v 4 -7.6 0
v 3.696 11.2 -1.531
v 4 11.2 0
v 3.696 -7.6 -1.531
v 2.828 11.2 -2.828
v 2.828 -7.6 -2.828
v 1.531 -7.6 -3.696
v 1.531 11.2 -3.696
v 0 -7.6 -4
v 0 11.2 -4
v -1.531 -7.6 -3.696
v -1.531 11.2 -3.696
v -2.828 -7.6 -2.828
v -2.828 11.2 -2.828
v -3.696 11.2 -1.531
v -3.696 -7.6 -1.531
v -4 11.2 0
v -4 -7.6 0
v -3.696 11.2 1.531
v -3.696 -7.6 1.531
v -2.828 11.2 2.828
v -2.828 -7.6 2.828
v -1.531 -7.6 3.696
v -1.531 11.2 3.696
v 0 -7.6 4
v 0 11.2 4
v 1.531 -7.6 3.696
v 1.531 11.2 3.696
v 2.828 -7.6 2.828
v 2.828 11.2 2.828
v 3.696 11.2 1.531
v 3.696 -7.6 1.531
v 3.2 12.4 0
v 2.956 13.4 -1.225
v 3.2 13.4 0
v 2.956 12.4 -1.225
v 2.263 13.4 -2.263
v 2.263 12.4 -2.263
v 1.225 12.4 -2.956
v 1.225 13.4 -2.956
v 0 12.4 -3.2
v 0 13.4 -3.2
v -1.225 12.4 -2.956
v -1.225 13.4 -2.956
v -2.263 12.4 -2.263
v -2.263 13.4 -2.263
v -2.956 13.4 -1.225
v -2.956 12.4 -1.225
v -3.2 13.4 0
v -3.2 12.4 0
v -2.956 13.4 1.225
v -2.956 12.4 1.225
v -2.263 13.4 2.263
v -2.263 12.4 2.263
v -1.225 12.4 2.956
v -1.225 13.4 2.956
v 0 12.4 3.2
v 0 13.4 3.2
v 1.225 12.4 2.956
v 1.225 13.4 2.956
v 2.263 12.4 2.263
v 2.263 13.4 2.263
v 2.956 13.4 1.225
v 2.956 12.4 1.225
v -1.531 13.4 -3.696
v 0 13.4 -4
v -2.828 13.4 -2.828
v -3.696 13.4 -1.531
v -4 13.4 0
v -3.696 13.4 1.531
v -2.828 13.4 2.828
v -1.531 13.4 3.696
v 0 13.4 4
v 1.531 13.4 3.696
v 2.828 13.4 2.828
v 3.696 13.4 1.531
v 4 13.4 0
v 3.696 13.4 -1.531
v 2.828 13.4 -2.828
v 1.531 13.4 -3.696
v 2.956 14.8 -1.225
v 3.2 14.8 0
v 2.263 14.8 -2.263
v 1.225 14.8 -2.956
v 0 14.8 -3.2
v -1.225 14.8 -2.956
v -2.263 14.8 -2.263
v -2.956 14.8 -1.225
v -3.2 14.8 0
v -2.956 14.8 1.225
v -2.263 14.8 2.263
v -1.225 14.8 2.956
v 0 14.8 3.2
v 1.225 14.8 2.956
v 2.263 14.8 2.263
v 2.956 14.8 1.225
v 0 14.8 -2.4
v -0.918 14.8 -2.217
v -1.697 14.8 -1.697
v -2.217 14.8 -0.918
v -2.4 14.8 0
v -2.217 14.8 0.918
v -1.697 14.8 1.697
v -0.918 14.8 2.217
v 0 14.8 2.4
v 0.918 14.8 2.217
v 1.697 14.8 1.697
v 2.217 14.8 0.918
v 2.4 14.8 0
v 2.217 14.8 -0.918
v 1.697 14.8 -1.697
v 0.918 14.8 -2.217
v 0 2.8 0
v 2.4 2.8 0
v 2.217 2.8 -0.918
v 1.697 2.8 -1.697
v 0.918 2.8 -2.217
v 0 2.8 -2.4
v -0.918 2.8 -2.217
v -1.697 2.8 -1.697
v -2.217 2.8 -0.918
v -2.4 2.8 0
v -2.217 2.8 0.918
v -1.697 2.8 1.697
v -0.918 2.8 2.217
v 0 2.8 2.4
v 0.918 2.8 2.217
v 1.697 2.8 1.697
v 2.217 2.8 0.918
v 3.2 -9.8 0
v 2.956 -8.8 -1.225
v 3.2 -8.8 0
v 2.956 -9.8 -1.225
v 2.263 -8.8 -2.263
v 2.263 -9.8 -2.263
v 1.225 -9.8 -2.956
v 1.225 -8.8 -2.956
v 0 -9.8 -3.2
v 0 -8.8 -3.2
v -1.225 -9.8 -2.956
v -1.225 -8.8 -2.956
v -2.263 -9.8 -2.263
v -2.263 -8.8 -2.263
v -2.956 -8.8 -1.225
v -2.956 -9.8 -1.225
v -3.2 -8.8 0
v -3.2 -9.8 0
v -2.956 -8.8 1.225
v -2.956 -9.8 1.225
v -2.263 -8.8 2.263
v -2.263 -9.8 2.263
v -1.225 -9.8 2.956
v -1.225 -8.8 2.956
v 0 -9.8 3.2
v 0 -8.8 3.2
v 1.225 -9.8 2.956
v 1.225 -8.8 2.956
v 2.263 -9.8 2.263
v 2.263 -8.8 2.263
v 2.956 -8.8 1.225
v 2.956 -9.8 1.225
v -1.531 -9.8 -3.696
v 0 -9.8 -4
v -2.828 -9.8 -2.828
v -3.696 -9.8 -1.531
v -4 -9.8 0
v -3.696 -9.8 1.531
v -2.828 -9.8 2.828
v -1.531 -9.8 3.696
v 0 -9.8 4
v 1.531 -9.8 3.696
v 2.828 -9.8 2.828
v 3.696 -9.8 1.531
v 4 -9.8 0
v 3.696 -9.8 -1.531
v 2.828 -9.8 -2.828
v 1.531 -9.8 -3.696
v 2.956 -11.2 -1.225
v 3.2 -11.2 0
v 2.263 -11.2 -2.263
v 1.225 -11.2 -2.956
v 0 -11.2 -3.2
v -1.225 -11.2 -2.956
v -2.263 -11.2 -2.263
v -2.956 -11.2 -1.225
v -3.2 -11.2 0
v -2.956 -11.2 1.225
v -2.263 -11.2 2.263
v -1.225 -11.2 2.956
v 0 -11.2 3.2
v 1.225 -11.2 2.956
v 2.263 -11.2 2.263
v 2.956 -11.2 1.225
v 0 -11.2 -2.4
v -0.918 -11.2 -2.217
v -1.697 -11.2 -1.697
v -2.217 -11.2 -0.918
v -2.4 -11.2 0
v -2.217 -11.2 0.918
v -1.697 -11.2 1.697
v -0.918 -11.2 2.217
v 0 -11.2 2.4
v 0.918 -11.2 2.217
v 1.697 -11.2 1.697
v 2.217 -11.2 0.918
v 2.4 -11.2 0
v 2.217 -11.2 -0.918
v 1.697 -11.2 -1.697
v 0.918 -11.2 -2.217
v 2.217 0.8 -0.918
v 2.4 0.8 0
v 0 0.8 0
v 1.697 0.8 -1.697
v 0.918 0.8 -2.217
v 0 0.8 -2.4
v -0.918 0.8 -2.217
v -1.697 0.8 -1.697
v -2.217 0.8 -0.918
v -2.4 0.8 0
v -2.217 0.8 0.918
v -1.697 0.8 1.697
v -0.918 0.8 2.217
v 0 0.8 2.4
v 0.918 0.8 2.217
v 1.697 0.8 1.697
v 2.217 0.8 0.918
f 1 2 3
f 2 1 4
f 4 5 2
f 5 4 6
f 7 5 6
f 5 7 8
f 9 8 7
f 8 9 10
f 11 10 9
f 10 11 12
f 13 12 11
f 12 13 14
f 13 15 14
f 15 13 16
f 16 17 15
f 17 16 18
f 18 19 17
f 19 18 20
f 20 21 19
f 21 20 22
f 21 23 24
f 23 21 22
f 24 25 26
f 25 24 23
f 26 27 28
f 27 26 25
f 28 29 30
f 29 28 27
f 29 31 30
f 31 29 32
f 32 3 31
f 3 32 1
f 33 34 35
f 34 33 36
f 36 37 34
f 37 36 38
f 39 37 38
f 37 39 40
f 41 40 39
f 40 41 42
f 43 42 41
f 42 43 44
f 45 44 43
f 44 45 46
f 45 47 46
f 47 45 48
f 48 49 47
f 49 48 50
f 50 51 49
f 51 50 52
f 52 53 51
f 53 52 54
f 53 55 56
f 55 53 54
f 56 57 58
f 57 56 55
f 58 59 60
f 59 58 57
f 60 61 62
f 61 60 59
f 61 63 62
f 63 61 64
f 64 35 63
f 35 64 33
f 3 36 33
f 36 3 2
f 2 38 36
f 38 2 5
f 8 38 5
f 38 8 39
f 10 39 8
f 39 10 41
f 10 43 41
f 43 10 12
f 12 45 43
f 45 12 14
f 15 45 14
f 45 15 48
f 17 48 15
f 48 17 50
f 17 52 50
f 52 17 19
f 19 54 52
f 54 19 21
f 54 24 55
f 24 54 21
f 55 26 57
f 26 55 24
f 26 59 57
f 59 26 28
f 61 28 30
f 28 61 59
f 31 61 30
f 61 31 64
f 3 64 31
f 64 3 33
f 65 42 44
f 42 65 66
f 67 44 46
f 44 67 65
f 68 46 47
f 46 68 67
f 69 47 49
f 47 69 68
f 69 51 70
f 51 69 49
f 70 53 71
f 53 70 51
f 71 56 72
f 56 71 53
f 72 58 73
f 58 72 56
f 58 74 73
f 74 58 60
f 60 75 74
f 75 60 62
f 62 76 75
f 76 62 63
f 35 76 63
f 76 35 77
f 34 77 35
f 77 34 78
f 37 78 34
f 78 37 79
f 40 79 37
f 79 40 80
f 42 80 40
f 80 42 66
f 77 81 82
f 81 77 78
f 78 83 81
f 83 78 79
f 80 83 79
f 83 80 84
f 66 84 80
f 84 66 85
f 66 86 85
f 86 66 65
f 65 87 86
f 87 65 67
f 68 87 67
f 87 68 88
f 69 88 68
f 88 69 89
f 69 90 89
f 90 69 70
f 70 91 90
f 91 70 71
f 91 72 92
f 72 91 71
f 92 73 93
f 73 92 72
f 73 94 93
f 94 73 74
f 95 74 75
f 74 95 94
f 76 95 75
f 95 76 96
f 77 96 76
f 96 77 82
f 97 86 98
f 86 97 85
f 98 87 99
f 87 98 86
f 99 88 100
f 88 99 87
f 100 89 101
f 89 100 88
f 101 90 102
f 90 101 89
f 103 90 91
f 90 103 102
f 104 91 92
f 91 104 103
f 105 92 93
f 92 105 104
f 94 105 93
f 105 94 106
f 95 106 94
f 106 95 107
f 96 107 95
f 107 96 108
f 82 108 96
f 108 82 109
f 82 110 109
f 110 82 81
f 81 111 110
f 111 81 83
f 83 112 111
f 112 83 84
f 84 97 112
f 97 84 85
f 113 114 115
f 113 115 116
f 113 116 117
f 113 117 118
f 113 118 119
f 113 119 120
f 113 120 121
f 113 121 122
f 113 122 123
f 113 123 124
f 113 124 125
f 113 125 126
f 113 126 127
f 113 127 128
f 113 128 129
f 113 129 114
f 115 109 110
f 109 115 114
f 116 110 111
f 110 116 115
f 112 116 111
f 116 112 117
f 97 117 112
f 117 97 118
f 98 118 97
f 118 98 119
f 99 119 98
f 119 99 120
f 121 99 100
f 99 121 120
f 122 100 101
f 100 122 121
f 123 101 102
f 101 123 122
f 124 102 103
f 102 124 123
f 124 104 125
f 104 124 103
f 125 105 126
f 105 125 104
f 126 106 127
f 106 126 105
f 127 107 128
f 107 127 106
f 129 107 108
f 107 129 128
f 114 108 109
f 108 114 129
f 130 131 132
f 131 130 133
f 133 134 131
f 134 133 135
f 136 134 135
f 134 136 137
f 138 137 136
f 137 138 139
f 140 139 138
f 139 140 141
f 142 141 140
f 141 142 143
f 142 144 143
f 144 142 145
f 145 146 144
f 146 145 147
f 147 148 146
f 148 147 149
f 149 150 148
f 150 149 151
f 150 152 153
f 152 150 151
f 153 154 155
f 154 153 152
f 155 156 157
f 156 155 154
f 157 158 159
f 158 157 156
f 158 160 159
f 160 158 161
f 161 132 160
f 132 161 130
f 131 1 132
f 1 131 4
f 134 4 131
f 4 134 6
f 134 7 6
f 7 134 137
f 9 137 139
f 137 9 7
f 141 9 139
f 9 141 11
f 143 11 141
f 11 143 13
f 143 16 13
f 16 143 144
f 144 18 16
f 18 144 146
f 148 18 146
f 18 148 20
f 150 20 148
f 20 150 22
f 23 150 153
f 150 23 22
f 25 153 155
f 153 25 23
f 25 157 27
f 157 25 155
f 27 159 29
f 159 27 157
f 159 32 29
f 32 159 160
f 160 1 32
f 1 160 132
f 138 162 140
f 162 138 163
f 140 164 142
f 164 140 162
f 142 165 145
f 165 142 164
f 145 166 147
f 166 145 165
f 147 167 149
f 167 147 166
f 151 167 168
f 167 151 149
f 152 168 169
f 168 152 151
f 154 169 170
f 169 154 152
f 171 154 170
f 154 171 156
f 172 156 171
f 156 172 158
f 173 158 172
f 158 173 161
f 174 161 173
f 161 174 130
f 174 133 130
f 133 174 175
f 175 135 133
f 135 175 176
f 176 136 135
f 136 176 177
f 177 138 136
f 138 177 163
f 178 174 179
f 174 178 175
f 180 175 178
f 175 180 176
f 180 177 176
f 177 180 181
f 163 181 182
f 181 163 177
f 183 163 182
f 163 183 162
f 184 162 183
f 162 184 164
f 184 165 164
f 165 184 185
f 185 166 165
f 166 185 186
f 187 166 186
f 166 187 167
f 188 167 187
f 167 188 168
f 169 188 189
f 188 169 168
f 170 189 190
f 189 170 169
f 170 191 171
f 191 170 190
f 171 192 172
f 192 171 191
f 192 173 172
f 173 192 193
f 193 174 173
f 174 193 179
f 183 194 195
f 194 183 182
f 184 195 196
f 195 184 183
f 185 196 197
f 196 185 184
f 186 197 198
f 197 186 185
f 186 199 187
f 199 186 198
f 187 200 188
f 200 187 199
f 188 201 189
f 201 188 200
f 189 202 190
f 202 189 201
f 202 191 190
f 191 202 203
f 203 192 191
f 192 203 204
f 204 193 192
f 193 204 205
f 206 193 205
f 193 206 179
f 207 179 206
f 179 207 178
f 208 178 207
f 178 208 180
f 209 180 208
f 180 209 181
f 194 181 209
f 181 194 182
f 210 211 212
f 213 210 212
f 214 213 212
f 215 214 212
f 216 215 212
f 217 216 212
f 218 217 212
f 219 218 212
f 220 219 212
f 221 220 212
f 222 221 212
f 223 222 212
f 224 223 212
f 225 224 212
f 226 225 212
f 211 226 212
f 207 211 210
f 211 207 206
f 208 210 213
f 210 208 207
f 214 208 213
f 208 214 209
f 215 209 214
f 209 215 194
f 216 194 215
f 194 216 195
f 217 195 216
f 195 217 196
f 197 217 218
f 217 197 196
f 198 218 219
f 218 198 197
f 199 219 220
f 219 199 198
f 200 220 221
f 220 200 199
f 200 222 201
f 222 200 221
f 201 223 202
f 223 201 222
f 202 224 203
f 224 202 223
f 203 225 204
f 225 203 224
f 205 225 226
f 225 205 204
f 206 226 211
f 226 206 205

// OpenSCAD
// file: ../p/4-4disc.scad
use <../lib.scad>
function ldraw_lib__4_4disc() = [
// 0 Disc 1.0
// 0 Name: 4-4disc.dat
// 0 Author: James Jessiman
// 0 !LDRAW_ORG Primitive UPDATE 2002-02
// 0 !LICENSE Licensed under CC BY 4.0 : see CAreadme.txt
// 
// 0 BFC CERTIFY CCW
  [0,"BFC","CERTIFY"],
  [0,"BFC","CCW"],
// 
// 0 !HISTORY 1998-12-15 [PTadmin] Official Update 1998-10
// 0 !HISTORY 2002-03-23 [sbliss] Added BFC statement
// 0 !HISTORY 2002-04-25 [PTadmin] Official Update 2002-02
// 0 !HISTORY 2007-06-24 [PTadmin] Header formatted for Contributor Agreement
// 0 !HISTORY 2008-07-01 [PTadmin] Official Update 2008-01
// 
// 
// 3 16 0 0 0 1 0 0 0.9239 0 0.3827
  [3,16,0,0,0,1,0,0,0.9239,0,0.3827],
// 3 16 0 0 0 0.9239 0 0.3827 0.7071 0 0.7071
  [3,16,0,0,0,0.9239,0,0.3827,0.7071,0,0.7071],
// 3 16 0 0 0 0.7071 0 0.7071 0.3827 0 0.9239
  [3,16,0,0,0,0.7071,0,0.7071,0.3827,0,0.9239],
// 3 16 0 0 0 0.3827 0 0.9239 0 0 1
  [3,16,0,0,0,0.3827,0,0.9239,0,0,1],
// 3 16 0 0 0 0 0 1 -0.3827 0 0.9239
  [3,16,0,0,0,0,0,1,-0.3827,0,0.9239],
// 3 16 0 0 0 -0.3827 0 0.9239 -0.7071 0 0.7071
  [3,16,0,0,0,-0.3827,0,0.9239,-0.7071,0,0.7071],
// 3 16 0 0 0 -0.7071 0 0.7071 -0.9239 0 0.3827
  [3,16,0,0,0,-0.7071,0,0.7071,-0.9239,0,0.3827],
// 3 16 0 0 0 -0.9239 0 0.3827 -1 0 -0
  [3,16,0,0,0,-0.9239,0,0.3827,-1,0,-0],
// 3 16 0 0 0 -1 0 -0 -0.9239 0 -0.3827
  [3,16,0,0,0,-1,0,-0,-0.9239,0,-0.3827],
// 3 16 0 0 0 -0.9239 0 -0.3827 -0.7071 0 -0.7071
  [3,16,0,0,0,-0.9239,0,-0.3827,-0.7071,0,-0.7071],
// 3 16 0 0 0 -0.7071 0 -0.7071 -0.3827 0 -0.9239
  [3,16,0,0,0,-0.7071,0,-0.7071,-0.3827,0,-0.9239],
// 3 16 0 0 0 -0.3827 0 -0.9239 0 0 -1
  [3,16,0,0,0,-0.3827,0,-0.9239,0,0,-1],
// 3 16 0 0 0 0 0 -1 0.3827 0 -0.9239
  [3,16,0,0,0,0,0,-1,0.3827,0,-0.9239],
// 3 16 0 0 0 0.3827 0 -0.9239 0.7071 0 -0.7071
  [3,16,0,0,0,0.3827,0,-0.9239,0.7071,0,-0.7071],
// 3 16 0 0 0 0.7071 0 -0.7071 0.9239 0 -0.3827
  [3,16,0,0,0,0.7071,0,-0.7071,0.9239,0,-0.3827],
// 3 16 0 0 0 0.9239 0 -0.3827 1 0 0
  [3,16,0,0,0,0.9239,0,-0.3827,1,0,0],
// 0
];
module ldraw_lib__4_4disc(step=0, col=false, unit=2/5, alt=false, line=0.2, solid=!$preview)
    makepoly(ldraw_lib__4_4disc(), step=step, col=col, unit=unit, alt=alt, line=line, solid=solid);
ldraw_lib__4_4disc(line=0.2);
// file: ../p/4-4cyli.scad
use <../lib.scad>
function ldraw_lib__4_4cyli() = [
// 0 Cylinder 1.0
// 0 Name: 4-4cyli.dat
// 0 Author: James Jessiman
// 0 !LDRAW_ORG Primitive UPDATE 2005-01
// 0 !LICENSE Licensed under CC BY 4.0 : see CAreadme.txt
// 
// 0 BFC CERTIFY CCW
  [0,"BFC","CERTIFY"],
  [0,"BFC","CCW"],
// 
// 0 !HISTORY 1998-12-15 [PTadmin] Official Update 1998-10
// 0 !HISTORY 2002-03-23 [sbliss] Added BFC statement; merged headers from files in distributions LDraw 0.27 and Complete.
// 0 !HISTORY 2002-04-25 [PTadmin] Official Update 2002-02
// 0 !HISTORY 2004-12-14 [guyvivan] BFC CCW
// 0 !HISTORY 2005-12-28 [PTadmin] Official Update 2005-01
// 0 !HISTORY 2007-06-24 [PTadmin] Header formatted for Contributor Agreement
// 0 !HISTORY 2008-07-01 [PTadmin] Official Update 2008-01
// 
// 
// 4 16 1 1 0 0.9239 1 0.3827 0.9239 0 0.3827 1 0 0
  [4,16,1,1,0,0.9239,1,0.3827,0.9239,0,0.3827,1,0,0],
// 5 24 1 0 0 1 1 0 0.9239 0 0.3827 0.9239 0 -0.3827
  [5,24,1,0,0,1,1,0,0.9239,0,0.3827,0.9239,0,-0.3827],
// 4 16 0.9239 1 0.3827 0.7071 1 0.7071 0.7071 0 0.7071 0.9239 0 0.3827
  [4,16,0.9239,1,0.3827,0.7071,1,0.7071,0.7071,0,0.7071,0.9239,0,0.3827],
// 5 24 0.9239 0 0.3827 0.9239 1 0.3827 0.7071 0 0.7071 1 0 0
  [5,24,0.9239,0,0.3827,0.9239,1,0.3827,0.7071,0,0.7071,1,0,0],
// 4 16 0.7071 1 0.7071 0.3827 1 0.9239 0.3827 0 0.9239 0.7071 0 0.7071
  [4,16,0.7071,1,0.7071,0.3827,1,0.9239,0.3827,0,0.9239,0.7071,0,0.7071],
// 5 24 0.7071 0 0.7071 0.7071 1 0.7071 0.3827 0 0.9239 0.9239 0 0.3827
  [5,24,0.7071,0,0.7071,0.7071,1,0.7071,0.3827,0,0.9239,0.9239,0,0.3827],
// 4 16 0.3827 1 0.9239 0 1 1 0 0 1 0.3827 0 0.9239
  [4,16,0.3827,1,0.9239,0,1,1,0,0,1,0.3827,0,0.9239],
// 5 24 0.3827 0 0.9239 0.3827 1 0.9239 0 0 1 0.7071 0 0.7071
  [5,24,0.3827,0,0.9239,0.3827,1,0.9239,0,0,1,0.7071,0,0.7071],
// 4 16 0 1 1 -0.3827 1 0.9239 -0.3827 0 0.9239 0 0 1
  [4,16,0,1,1,-0.3827,1,0.9239,-0.3827,0,0.9239,0,0,1],
// 5 24 0 0 1 0 1 1 -0.3827 0 0.9239 0.3827 0 0.9239
  [5,24,0,0,1,0,1,1,-0.3827,0,0.9239,0.3827,0,0.9239],
// 4 16 -0.3827 1 0.9239 -0.7071 1 0.7071 -0.7071 0 0.7071 -0.3827 0 0.9239
  [4,16,-0.3827,1,0.9239,-0.7071,1,0.7071,-0.7071,0,0.7071,-0.3827,0,0.9239],
// 5 24 -0.3827 0 0.9239 -0.3827 1 0.9239 -0.7071 0 0.7071 0 0 1
  [5,24,-0.3827,0,0.9239,-0.3827,1,0.9239,-0.7071,0,0.7071,0,0,1],
// 4 16 -0.7071 1 0.7071 -0.9239 1 0.3827 -0.9239 0 0.3827 -0.7071 0 0.7071
  [4,16,-0.7071,1,0.7071,-0.9239,1,0.3827,-0.9239,0,0.3827,-0.7071,0,0.7071],
// 5 24 -0.7071 0 0.7071 -0.7071 1 0.7071 -0.9239 0 0.3827 -0.3827 0 0.9239
  [5,24,-0.7071,0,0.7071,-0.7071,1,0.7071,-0.9239,0,0.3827,-0.3827,0,0.9239],
// 4 16 -0.9239 1 0.3827 -1 1 0 -1 0 0 -0.9239 0 0.3827
  [4,16,-0.9239,1,0.3827,-1,1,0,-1,0,0,-0.9239,0,0.3827],
// 5 24 -0.9239 0 0.3827 -0.9239 1 0.3827 -1 0 0 -0.7071 0 0.7071
  [5,24,-0.9239,0,0.3827,-0.9239,1,0.3827,-1,0,0,-0.7071,0,0.7071],
// 4 16 -1 1 0 -0.9239 1 -0.3827 -0.9239 0 -0.3827 -1 0 0
  [4,16,-1,1,0,-0.9239,1,-0.3827,-0.9239,0,-0.3827,-1,0,0],
// 5 24 -1 0 0 -1 1 0 -0.9239 0 -0.3827 -0.9239 0 0.3827
  [5,24,-1,0,0,-1,1,0,-0.9239,0,-0.3827,-0.9239,0,0.3827],
// 4 16 -0.9239 1 -0.3827 -0.7071 1 -0.7071 -0.7071 0 -0.7071 -0.9239 0 -0.3827
  [4,16,-0.9239,1,-0.3827,-0.7071,1,-0.7071,-0.7071,0,-0.7071,-0.9239,0,-0.3827],
// 5 24 -0.9239 0 -0.3827 -0.9239 1 -0.3827 -0.7071 0 -0.7071 -1 0 0
  [5,24,-0.9239,0,-0.3827,-0.9239,1,-0.3827,-0.7071,0,-0.7071,-1,0,0],
// 4 16 -0.7071 1 -0.7071 -0.3827 1 -0.9239 -0.3827 0 -0.9239 -0.7071 0 -0.7071
  [4,16,-0.7071,1,-0.7071,-0.3827,1,-0.9239,-0.3827,0,-0.9239,-0.7071,0,-0.7071],
// 5 24 -0.7071 0 -0.7071 -0.7071 1 -0.7071 -0.3827 0 -0.9239 -0.9239 0 -0.3827
  [5,24,-0.7071,0,-0.7071,-0.7071,1,-0.7071,-0.3827,0,-0.9239,-0.9239,0,-0.3827],
// 4 16 -0.3827 1 -0.9239 0 1 -1 0 0 -1 -0.3827 0 -0.9239
  [4,16,-0.3827,1,-0.9239,0,1,-1,0,0,-1,-0.3827,0,-0.9239],
// 5 24 -0.3827 0 -0.9239 -0.3827 1 -0.9239 0 0 -1 -0.7071 0 -0.7071
  [5,24,-0.3827,0,-0.9239,-0.3827,1,-0.9239,0,0,-1,-0.7071,0,-0.7071],
// 4 16 0 1 -1 0.3827 1 -0.9239 0.3827 0 -0.9239 0 0 -1
  [4,16,0,1,-1,0.3827,1,-0.9239,0.3827,0,-0.9239,0,0,-1],
// 5 24 0 0 -1 0 1 -1 0.3827 0 -0.9239 -0.3827 0 -0.9239
  [5,24,0,0,-1,0,1,-1,0.3827,0,-0.9239,-0.3827,0,-0.9239],
// 4 16 0.3827 1 -0.9239 0.7071 1 -0.7071 0.7071 0 -0.7071 0.3827 0 -0.9239
  [4,16,0.3827,1,-0.9239,0.7071,1,-0.7071,0.7071,0,-0.7071,0.3827,0,-0.9239],
// 5 24 0.3827 0 -0.9239 0.3827 1 -0.9239 0.7071 0 -0.7071 0 0 -1
  [5,24,0.3827,0,-0.9239,0.3827,1,-0.9239,0.7071,0,-0.7071,0,0,-1],
// 4 16 0.7071 1 -0.7071 0.9239 1 -0.3827 0.9239 0 -0.3827 0.7071 0 -0.7071
  [4,16,0.7071,1,-0.7071,0.9239,1,-0.3827,0.9239,0,-0.3827,0.7071,0,-0.7071],
// 5 24 0.7071 0 -0.7071 0.7071 1 -0.7071 0.9239 0 -0.3827 0.3827 0 -0.9239
  [5,24,0.7071,0,-0.7071,0.7071,1,-0.7071,0.9239,0,-0.3827,0.3827,0,-0.9239],
// 4 16 0.9239 1 -0.3827 1 1 0 1 0 0 0.9239 0 -0.3827
  [4,16,0.9239,1,-0.3827,1,1,0,1,0,0,0.9239,0,-0.3827],
// 5 24 0.9239 0 -0.3827 0.9239 1 -0.3827 1 0 0 0.7071 0 -0.7071
  [5,24,0.9239,0,-0.3827,0.9239,1,-0.3827,1,0,0,0.7071,0,-0.7071],
// 0
];
module ldraw_lib__4_4cyli(step=0, col=false, unit=2/5, alt=false, line=0.2, solid=!$preview)
    makepoly(ldraw_lib__4_4cyli(), step=step, col=col, unit=unit, alt=alt, line=line, solid=solid);
ldraw_lib__4_4cyli(line=0.2);
// file: ../p/4-4ring4.scad
use <../lib.scad>
function ldraw_lib__4_4ring4() = [
// 0 Ring  4 x 1.0
// 0 Name: 4-4ring4.dat
// 0 Author: James Jessiman
// 0 !LDRAW_ORG Primitive UPDATE 2009-01
// 0 !LICENSE Licensed under CC BY 4.0 : see CAreadme.txt
// 
// 0 BFC CERTIFY CCW
  [0,"BFC","CERTIFY"],
  [0,"BFC","CCW"],
// 
// 0 !HISTORY 1998-12-15 [PTadmin] Official Update 1998-10
// 0 !HISTORY 2002-04-08 [BrickCaster] Modified for BFC compliance
// 0 !HISTORY 2002-04-25 [PTadmin] Official Update 2002-02
// 0 !HISTORY 2007-06-24 [PTadmin] Header formatted for Contributor Agreement
// 0 !HISTORY 2008-07-01 [PTadmin] Official Update 2008-01
// 0 !HISTORY 2008-08-26 [cwdee] Switch polygon winding and rename
// 0 !HISTORY 2009-05-02 [PTadmin] Official Update 2009-01
// 
// 
// 4 16 -1.9135 0 4.6195 -1.5308 0 3.6956 0 0 4 0 0 5
  [4,16,-1.9135,0,4.6195,-1.5308,0,3.6956,0,0,4,0,0,5],
// 4 16 -3.5355 0 3.5355 -2.8284 0 2.8284 -1.5308 0 3.6956 -1.9135 0 4.6195
  [4,16,-3.5355,0,3.5355,-2.8284,0,2.8284,-1.5308,0,3.6956,-1.9135,0,4.6195],
// 4 16 -4.6195 0 1.9135 -3.6956 0 1.5308 -2.8284 0 2.8284 -3.5355 0 3.5355
  [4,16,-4.6195,0,1.9135,-3.6956,0,1.5308,-2.8284,0,2.8284,-3.5355,0,3.5355],
// 4 16 -5 0 0 -4 0 0 -3.6956 0 1.5308 -4.6195 0 1.9135
  [4,16,-5,0,0,-4,0,0,-3.6956,0,1.5308,-4.6195,0,1.9135],
// 4 16 -4.6195 0 -1.9135 -3.6956 0 -1.5308 -4 0 0 -5 0 0
  [4,16,-4.6195,0,-1.9135,-3.6956,0,-1.5308,-4,0,0,-5,0,0],
// 4 16 -3.5355 0 -3.5355 -2.8284 0 -2.8284 -3.6956 0 -1.5308 -4.6195 0 -1.9135
  [4,16,-3.5355,0,-3.5355,-2.8284,0,-2.8284,-3.6956,0,-1.5308,-4.6195,0,-1.9135],
// 4 16 -1.9135 0 -4.6195 -1.5308 0 -3.6956 -2.8284 0 -2.8284 -3.5355 0 -3.5355
  [4,16,-1.9135,0,-4.6195,-1.5308,0,-3.6956,-2.8284,0,-2.8284,-3.5355,0,-3.5355],
// 4 16 0 0 -5 0 0 -4 -1.5308 0 -3.6956 -1.9135 0 -4.6195
  [4,16,0,0,-5,0,0,-4,-1.5308,0,-3.6956,-1.9135,0,-4.6195],
// 4 16 1.9135 0 -4.6195 1.5308 0 -3.6956 0 0 -4 0 0 -5
  [4,16,1.9135,0,-4.6195,1.5308,0,-3.6956,0,0,-4,0,0,-5],
// 4 16 3.5355 0 -3.5355 2.8284 0 -2.8284 1.5308 0 -3.6956 1.9135 0 -4.6195
  [4,16,3.5355,0,-3.5355,2.8284,0,-2.8284,1.5308,0,-3.6956,1.9135,0,-4.6195],
// 4 16 4.6195 0 -1.9135 3.6956 0 -1.5308 2.8284 0 -2.8284 3.5355 0 -3.5355
  [4,16,4.6195,0,-1.9135,3.6956,0,-1.5308,2.8284,0,-2.8284,3.5355,0,-3.5355],
// 4 16 5 0 0 4 0 0 3.6956 0 -1.5308 4.6195 0 -1.9135
  [4,16,5,0,0,4,0,0,3.6956,0,-1.5308,4.6195,0,-1.9135],
// 4 16 4.6195 0 1.9135 3.6956 0 1.5308 4 0 0 5 0 0
  [4,16,4.6195,0,1.9135,3.6956,0,1.5308,4,0,0,5,0,0],
// 4 16 3.5355 0 3.5355 2.8284 0 2.8284 3.6956 0 1.5308 4.6195 0 1.9135
  [4,16,3.5355,0,3.5355,2.8284,0,2.8284,3.6956,0,1.5308,4.6195,0,1.9135],
// 4 16 1.9135 0 4.6195 1.5308 0 3.6956 2.8284 0 2.8284 3.5355 0 3.5355
  [4,16,1.9135,0,4.6195,1.5308,0,3.6956,2.8284,0,2.8284,3.5355,0,3.5355],
// 4 16 0 0 5 0 0 4 1.5308 0 3.6956 1.9135 0 4.6195
  [4,16,0,0,5,0,0,4,1.5308,0,3.6956,1.9135,0,4.6195],
// 0
];
module ldraw_lib__4_4ring4(step=0, col=false, unit=2/5, alt=false, line=0.2, solid=!$preview)
    makepoly(ldraw_lib__4_4ring4(), step=step, col=col, unit=unit, alt=alt, line=line, solid=solid);
ldraw_lib__4_4ring4(line=0.2);
// file: ../p/4-4ring3.scad
use <../lib.scad>
function ldraw_lib__4_4ring3() = [
// 0 Ring  3 x 1.0
// 0 Name: 4-4ring3.dat
// 0 Author: James Jessiman
// 0 !LDRAW_ORG Primitive UPDATE 2009-01
// 0 !LICENSE Licensed under CC BY 4.0 : see CAreadme.txt
// 
// 0 BFC CERTIFY CCW
  [0,"BFC","CERTIFY"],
  [0,"BFC","CCW"],
// 
// 0 !HISTORY 1998-12-15 [PTadmin] Official Update 1998-10
// 0 !HISTORY 2002-04-05 [hafhead] Added BFC statement
// 0 !HISTORY 2002-04-25 [PTadmin] Official Update 2002-02
// 0 !HISTORY 2007-06-24 [PTadmin] Header formatted for Contributor Agreement
// 0 !HISTORY 2008-07-01 [PTadmin] Official Update 2008-01
// 0 !HISTORY 2008-08-26 [cwdee] Switch polygon winding and rename
// 0 !HISTORY 2009-05-02 [PTadmin] Official Update 2009-01
// 
// 
// 4 16 -1.5308 0 3.6956 -1.1481 0 2.7717 0 0 3 0 0 4
  [4,16,-1.5308,0,3.6956,-1.1481,0,2.7717,0,0,3,0,0,4],
// 4 16 -2.8284 0 2.8284 -2.1213 0 2.1213 -1.1481 0 2.7717 -1.5308 0 3.6956
  [4,16,-2.8284,0,2.8284,-2.1213,0,2.1213,-1.1481,0,2.7717,-1.5308,0,3.6956],
// 4 16 -3.6956 0 1.5308 -2.7717 0 1.1481 -2.1213 0 2.1213 -2.8284 0 2.8284
  [4,16,-3.6956,0,1.5308,-2.7717,0,1.1481,-2.1213,0,2.1213,-2.8284,0,2.8284],
// 4 16 -4 0 0 -3 0 0 -2.7717 0 1.1481 -3.6956 0 1.5308
  [4,16,-4,0,0,-3,0,0,-2.7717,0,1.1481,-3.6956,0,1.5308],
// 4 16 -3.6956 0 -1.5308 -2.7717 0 -1.1481 -3 0 0 -4 0 0
  [4,16,-3.6956,0,-1.5308,-2.7717,0,-1.1481,-3,0,0,-4,0,0],
// 4 16 -2.8284 0 -2.8284 -2.1213 0 -2.1213 -2.7717 0 -1.1481 -3.6956 0 -1.5308
  [4,16,-2.8284,0,-2.8284,-2.1213,0,-2.1213,-2.7717,0,-1.1481,-3.6956,0,-1.5308],
// 4 16 -1.5308 0 -3.6956 -1.1481 0 -2.7717 -2.1213 0 -2.1213 -2.8284 0 -2.8284
  [4,16,-1.5308,0,-3.6956,-1.1481,0,-2.7717,-2.1213,0,-2.1213,-2.8284,0,-2.8284],
// 4 16 0 0 -4 0 0 -3 -1.1481 0 -2.7717 -1.5308 0 -3.6956
  [4,16,0,0,-4,0,0,-3,-1.1481,0,-2.7717,-1.5308,0,-3.6956],
// 4 16 1.5308 0 -3.6956 1.1481 0 -2.7717 0 0 -3 0 0 -4
  [4,16,1.5308,0,-3.6956,1.1481,0,-2.7717,0,0,-3,0,0,-4],
// 4 16 2.8284 0 -2.8284 2.1213 0 -2.1213 1.1481 0 -2.7717 1.5308 0 -3.6956
  [4,16,2.8284,0,-2.8284,2.1213,0,-2.1213,1.1481,0,-2.7717,1.5308,0,-3.6956],
// 4 16 3.6956 0 -1.5308 2.7717 0 -1.1481 2.1213 0 -2.1213 2.8284 0 -2.8284
  [4,16,3.6956,0,-1.5308,2.7717,0,-1.1481,2.1213,0,-2.1213,2.8284,0,-2.8284],
// 4 16 4 0 0 3 0 0 2.7717 0 -1.1481 3.6956 0 -1.5308
  [4,16,4,0,0,3,0,0,2.7717,0,-1.1481,3.6956,0,-1.5308],
// 4 16 3.6956 0 1.5308 2.7717 0 1.1481 3 0 0 4 0 0
  [4,16,3.6956,0,1.5308,2.7717,0,1.1481,3,0,0,4,0,0],
// 4 16 2.8284 0 2.8284 2.1213 0 2.1213 2.7717 0 1.1481 3.6956 0 1.5308
  [4,16,2.8284,0,2.8284,2.1213,0,2.1213,2.7717,0,1.1481,3.6956,0,1.5308],
// 4 16 1.5308 0 3.6956 1.1481 0 2.7717 2.1213 0 2.1213 2.8284 0 2.8284
  [4,16,1.5308,0,3.6956,1.1481,0,2.7717,2.1213,0,2.1213,2.8284,0,2.8284],
// 4 16 0 0 4 0 0 3 1.1481 0 2.7717 1.5308 0 3.6956
  [4,16,0,0,4,0,0,3,1.1481,0,2.7717,1.5308,0,3.6956],
// 0
];
module ldraw_lib__4_4ring3(step=0, col=false, unit=2/5, alt=false, line=0.2, solid=!$preview)
    makepoly(ldraw_lib__4_4ring3(), step=step, col=col, unit=unit, alt=alt, line=line, solid=solid);
ldraw_lib__4_4ring3(line=0.2);
// file: ../p/4-4edge.scad
use <../lib.scad>
function ldraw_lib__4_4edge() = [
// 0 Circle 1.0
// 0 Name: 4-4edge.dat
// 0 Author: James Jessiman
// 0 !LDRAW_ORG Primitive UPDATE 2017-01
// 0 !LICENSE Licensed under CC BY 4.0 : see CAreadme.txt
// 
// 0 BFC CERTIFY CCW
  [0,"BFC","CERTIFY"],
  [0,"BFC","CCW"],
// 
// 0 !HISTORY 1998-12-15 [PTadmin] Official Update 1998-10
// 0 !HISTORY 2005-12-28 [PTadmin] Official Update 2005-01
// 0 !HISTORY 2007-06-24 [PTadmin] Header formatted for Contributor Agreement
// 0 !HISTORY 2008-07-01 [PTadmin] Official Update 2008-01
// 0 !HISTORY 2017-01-15 [Steffen] BFCed
// 0 !HISTORY 2017-12-30 [PTadmin] Official Update 2017-01
// 
// 
// 2 24 1 0 0 0.9239 0 0.3827
  [2,24,1,0,0,0.9239,0,0.3827],
// 2 24 0.9239 0 0.3827 0.7071 0 0.7071
  [2,24,0.9239,0,0.3827,0.7071,0,0.7071],
// 2 24 0.7071 0 0.7071 0.3827 0 0.9239
  [2,24,0.7071,0,0.7071,0.3827,0,0.9239],
// 2 24 0.3827 0 0.9239 0 0 1
  [2,24,0.3827,0,0.9239,0,0,1],
// 2 24 0 0 1 -0.3827 0 0.9239
  [2,24,0,0,1,-0.3827,0,0.9239],
// 2 24 -0.3827 0 0.9239 -0.7071 0 0.7071
  [2,24,-0.3827,0,0.9239,-0.7071,0,0.7071],
// 2 24 -0.7071 0 0.7071 -0.9239 0 0.3827
  [2,24,-0.7071,0,0.7071,-0.9239,0,0.3827],
// 2 24 -0.9239 0 0.3827 -1 0 -0
  [2,24,-0.9239,0,0.3827,-1,0,-0],
// 2 24 -1 0 -0 -0.9239 0 -0.3827
  [2,24,-1,0,-0,-0.9239,0,-0.3827],
// 2 24 -0.9239 0 -0.3827 -0.7071 0 -0.7071
  [2,24,-0.9239,0,-0.3827,-0.7071,0,-0.7071],
// 2 24 -0.7071 0 -0.7071 -0.3827 0 -0.9239
  [2,24,-0.7071,0,-0.7071,-0.3827,0,-0.9239],
// 2 24 -0.3827 0 -0.9239 0 0 -1
  [2,24,-0.3827,0,-0.9239,0,0,-1],
// 2 24 0 0 -1 0.3827 0 -0.9239
  [2,24,0,0,-1,0.3827,0,-0.9239],
// 2 24 0.3827 0 -0.9239 0.7071 0 -0.7071
  [2,24,0.3827,0,-0.9239,0.7071,0,-0.7071],
// 2 24 0.7071 0 -0.7071 0.9239 0 -0.3827
  [2,24,0.7071,0,-0.7071,0.9239,0,-0.3827],
// 2 24 0.9239 0 -0.3827 1 0 0
  [2,24,0.9239,0,-0.3827,1,0,0],
];
module ldraw_lib__4_4edge(step=0, col=false, unit=2/5, alt=false, line=0.2, solid=!$preview)
    makepoly(ldraw_lib__4_4edge(), step=step, col=col, unit=unit, alt=alt, line=line, solid=solid);
ldraw_lib__4_4edge(line=0.2);
// file: ../p/4-4cylo.scad
use <../lib.scad>
use <4-4cyli.scad>
use <4-4edge.scad>
function ldraw_lib__4_4cylo() = [
// 0 Cylinder Open 1.0
// 0 Name: 4-4cylo.dat
// 0 Author: Mark Kennedy [mkennedy]
// 0 !LDRAW_ORG Primitive UPDATE 2010-01
// 0 !LICENSE Licensed under CC BY 4.0 : see CAreadme.txt
// 
// 0 BFC CERTIFY CCW
  [0,"BFC","CERTIFY"],
  [0,"BFC","CCW"],
// 
// 0 !HISTORY 2010-04-05 [PTadmin] Official Update 2010-01
// 
// 
// 1 16 0 0 0 1 0 0 0 1 0 0 0 1 4-4edge.dat
  [1,16,0,0,0,1,0,0,0,1,0,0,0,1, ldraw_lib__4_4edge()],
// 1 16 0 1 0 1 0 0 0 1 0 0 0 1 4-4edge.dat
  [1,16,0,1,0,1,0,0,0,1,0,0,0,1, ldraw_lib__4_4edge()],
// 1 16 0 0 0 1 0 0 0 1 0 0 0 1 4-4cyli.dat
  [1,16,0,0,0,1,0,0,0,1,0,0,0,1, ldraw_lib__4_4cyli()],
// 0
];
module ldraw_lib__4_4cylo(step=0, col=false, unit=2/5, alt=false, line=0.2, solid=!$preview)
    makepoly(ldraw_lib__4_4cylo(), step=step, col=col, unit=unit, alt=alt, line=line, solid=solid);
ldraw_lib__4_4cylo(line=0.2);
// file: ../p/4-4cylc.scad
use <../lib.scad>
use <4-4cyli.scad>
use <4-4disc.scad>
use <4-4edge.scad>
function ldraw_lib__4_4cylc() = [
// 0 Cylinder Closed 1.0
// 0 Name: 4-4cylc.dat
// 0 Author: Alex Taylor [anathema]
// 0 !LDRAW_ORG Primitive UPDATE 2009-02
// 0 !LICENSE Licensed under CC BY 4.0 : see CAreadme.txt
// 
// 0 BFC CERTIFY CCW
  [0,"BFC","CERTIFY"],
  [0,"BFC","CCW"],
// 
// 0 !HISTORY 2008-12-29 [cwdee] Removed one disc
// 0 !HISTORY 2009-09-03 [PTadmin] Official Update 2009-02
// 
// 
// 1 16 0 0 0 1 0 0 0 1 0 0 0 1 4-4edge.dat
  [1,16,0,0,0,1,0,0,0,1,0,0,0,1, ldraw_lib__4_4edge()],
// 1 16 0 1 0 1 0 0 0 1 0 0 0 1 4-4edge.dat
  [1,16,0,1,0,1,0,0,0,1,0,0,0,1, ldraw_lib__4_4edge()],
// 1 16 0 0 0 1 0 0 0 1 0 0 0 1 4-4disc.dat
  [1,16,0,0,0,1,0,0,0,1,0,0,0,1, ldraw_lib__4_4disc()],
// 1 16 0 0 0 1 0 0 0 1 0 0 0 1 4-4cyli.dat
  [1,16,0,0,0,1,0,0,0,1,0,0,0,1, ldraw_lib__4_4cyli()],
// 0
];
module ldraw_lib__4_4cylc(step=0, col=false, unit=2/5, alt=false, line=0.2, solid=!$preview)
    makepoly(ldraw_lib__4_4cylc(), step=step, col=col, unit=unit, alt=alt, line=line, solid=solid);
ldraw_lib__4_4cylc(line=0.2);
// file: ../p/4-4con4.scad
use <../lib.scad>
function ldraw_lib__4_4con4() = [
// 0 Cone  4 x 1.0
// 0 Name: 4-4con4.dat
// 0 Author: Willy Tschager [Holly-Wood]
// 0 !LDRAW_ORG Primitive UPDATE 2024-01
// 0 !LICENSE Licensed under CC BY 4.0 : see CAreadme.txt
// 
// 0 BFC CERTIFY CCW
  [0,"BFC","CERTIFY"],
  [0,"BFC","CCW"],
// 
// 0 !HISTORY 2003-08-01 [PTadmin] Official Update 2003-02
// 0 !HISTORY 2007-06-24 [PTadmin] Header formatted for Contributor Agreement
// 0 !HISTORY 2008-07-01 [PTadmin] Official Update 2008-01
// 0 !HISTORY 2012-02-16 [Philo] Changed to CCW
// 0 !HISTORY 2012-03-30 [PTadmin] Official Update 2012-01
// 0 !HISTORY 2024-01-07 [Holly-Wood] Complete regeneration, original by jriley
// 0 !HISTORY 2024-01-29 [OrionP] Official Update 2024-01
// 
// 4 16 4 1 0 3.6956 1 1.5308 4.6195 0 1.9135 5 0 0
  [4,16,4,1,0,3.6956,1,1.5308,4.6195,0,1.9135,5,0,0],
// 4 16 3.6956 1 1.5308 2.8284 1 2.8284 3.5355 0 3.5355 4.6195 0 1.9135
  [4,16,3.6956,1,1.5308,2.8284,1,2.8284,3.5355,0,3.5355,4.6195,0,1.9135],
// 4 16 2.8284 1 2.8284 1.5308 1 3.6956 1.9135 0 4.6195 3.5355 0 3.5355
  [4,16,2.8284,1,2.8284,1.5308,1,3.6956,1.9135,0,4.6195,3.5355,0,3.5355],
// 4 16 1.5308 1 3.6956 0 1 4 0 0 5 1.9135 0 4.6195
  [4,16,1.5308,1,3.6956,0,1,4,0,0,5,1.9135,0,4.6195],
// 4 16 0 1 4 -1.5308 1 3.6956 -1.9135 0 4.6195 0 0 5
  [4,16,0,1,4,-1.5308,1,3.6956,-1.9135,0,4.6195,0,0,5],
// 4 16 -1.5308 1 3.6956 -2.8284 1 2.8284 -3.5355 0 3.5355 -1.9135 0 4.6195
  [4,16,-1.5308,1,3.6956,-2.8284,1,2.8284,-3.5355,0,3.5355,-1.9135,0,4.6195],
// 4 16 -2.8284 1 2.8284 -3.6956 1 1.5308 -4.6195 0 1.9135 -3.5355 0 3.5355
  [4,16,-2.8284,1,2.8284,-3.6956,1,1.5308,-4.6195,0,1.9135,-3.5355,0,3.5355],
// 4 16 -3.6956 1 1.5308 -4 1 0 -5 0 0 -4.6195 0 1.9135
  [4,16,-3.6956,1,1.5308,-4,1,0,-5,0,0,-4.6195,0,1.9135],
// 4 16 -4 1 0 -3.6956 1 -1.5308 -4.6195 0 -1.9135 -5 0 0
  [4,16,-4,1,0,-3.6956,1,-1.5308,-4.6195,0,-1.9135,-5,0,0],
// 4 16 -3.6956 1 -1.5308 -2.8284 1 -2.8284 -3.5355 0 -3.5355 -4.6195 0 -1.9135
  [4,16,-3.6956,1,-1.5308,-2.8284,1,-2.8284,-3.5355,0,-3.5355,-4.6195,0,-1.9135],
// 4 16 -2.8284 1 -2.8284 -1.5308 1 -3.6956 -1.9135 0 -4.6195 -3.5355 0 -3.5355
  [4,16,-2.8284,1,-2.8284,-1.5308,1,-3.6956,-1.9135,0,-4.6195,-3.5355,0,-3.5355],
// 4 16 -1.5308 1 -3.6956 0 1 -4 0 0 -5 -1.9135 0 -4.6195
  [4,16,-1.5308,1,-3.6956,0,1,-4,0,0,-5,-1.9135,0,-4.6195],
// 4 16 0 1 -4 1.5308 1 -3.6956 1.9135 0 -4.6195 0 0 -5
  [4,16,0,1,-4,1.5308,1,-3.6956,1.9135,0,-4.6195,0,0,-5],
// 4 16 1.5308 1 -3.6956 2.8284 1 -2.8284 3.5355 0 -3.5355 1.9135 0 -4.6195
  [4,16,1.5308,1,-3.6956,2.8284,1,-2.8284,3.5355,0,-3.5355,1.9135,0,-4.6195],
// 4 16 2.8284 1 -2.8284 3.6956 1 -1.5308 4.6195 0 -1.9135 3.5355 0 -3.5355
  [4,16,2.8284,1,-2.8284,3.6956,1,-1.5308,4.6195,0,-1.9135,3.5355,0,-3.5355],
// 4 16 3.6956 1 -1.5308 4 1 0 5 0 0 4.6195 0 -1.9135
  [4,16,3.6956,1,-1.5308,4,1,0,5,0,0,4.6195,0,-1.9135],
// 0 // conditional lines
// 5 24 4 1 0 5 0 0 3.6956 1 -1.5308 3.6956 1 1.5308
  [5,24,4,1,0,5,0,0,3.6956,1,-1.5308,3.6956,1,1.5308],
// 5 24 3.6956 1 1.5308 4.6195 0 1.9135 4 1 0 2.8284 1 2.8284
  [5,24,3.6956,1,1.5308,4.6195,0,1.9135,4,1,0,2.8284,1,2.8284],
// 5 24 2.8284 1 2.8284 3.5355 0 3.5355 3.6956 1 1.5308 1.5308 1 3.6956
  [5,24,2.8284,1,2.8284,3.5355,0,3.5355,3.6956,1,1.5308,1.5308,1,3.6956],
// 5 24 1.5308 1 3.6956 1.9135 0 4.6195 2.8284 1 2.8284 0 1 4
  [5,24,1.5308,1,3.6956,1.9135,0,4.6195,2.8284,1,2.8284,0,1,4],
// 5 24 0 1 4 0 0 5 1.5308 1 3.6956 -1.5308 1 3.6956
  [5,24,0,1,4,0,0,5,1.5308,1,3.6956,-1.5308,1,3.6956],
// 5 24 -1.5308 1 3.6956 -1.9135 0 4.6195 0 1 4 -2.8284 1 2.8284
  [5,24,-1.5308,1,3.6956,-1.9135,0,4.6195,0,1,4,-2.8284,1,2.8284],
// 5 24 -2.8284 1 2.8284 -3.5355 0 3.5355 -1.5308 1 3.6956 -3.6956 1 1.5308
  [5,24,-2.8284,1,2.8284,-3.5355,0,3.5355,-1.5308,1,3.6956,-3.6956,1,1.5308],
// 5 24 -3.6956 1 1.5308 -4.6195 0 1.9135 -2.8284 1 2.8284 -4 1 0
  [5,24,-3.6956,1,1.5308,-4.6195,0,1.9135,-2.8284,1,2.8284,-4,1,0],
// 5 24 -4 1 0 -5 0 0 -3.6956 1 1.5308 -3.6956 1 -1.5308
  [5,24,-4,1,0,-5,0,0,-3.6956,1,1.5308,-3.6956,1,-1.5308],
// 5 24 -3.6956 1 -1.5308 -4.6195 0 -1.9135 -4 1 0 -2.8284 1 -2.8284
  [5,24,-3.6956,1,-1.5308,-4.6195,0,-1.9135,-4,1,0,-2.8284,1,-2.8284],
// 5 24 -2.8284 1 -2.8284 -3.5355 0 -3.5355 -3.6956 1 -1.5308 -1.5308 1 -3.6956
  [5,24,-2.8284,1,-2.8284,-3.5355,0,-3.5355,-3.6956,1,-1.5308,-1.5308,1,-3.6956],
// 5 24 -1.5308 1 -3.6956 -1.9135 0 -4.6195 -2.8284 1 -2.8284 0 1 -4
  [5,24,-1.5308,1,-3.6956,-1.9135,0,-4.6195,-2.8284,1,-2.8284,0,1,-4],
// 5 24 0 1 -4 0 0 -5 -1.5308 1 -3.6956 1.5308 1 -3.6956
  [5,24,0,1,-4,0,0,-5,-1.5308,1,-3.6956,1.5308,1,-3.6956],
// 5 24 1.5308 1 -3.6956 1.9135 0 -4.6195 0 1 -4 2.8284 1 -2.8284
  [5,24,1.5308,1,-3.6956,1.9135,0,-4.6195,0,1,-4,2.8284,1,-2.8284],
// 5 24 2.8284 1 -2.8284 3.5355 0 -3.5355 1.5308 1 -3.6956 3.6956 1 -1.5308
  [5,24,2.8284,1,-2.8284,3.5355,0,-3.5355,1.5308,1,-3.6956,3.6956,1,-1.5308],
// 5 24 3.6956 1 -1.5308 4.6195 0 -1.9135 2.8284 1 -2.8284 4 1 0
  [5,24,3.6956,1,-1.5308,4.6195,0,-1.9135,2.8284,1,-2.8284,4,1,0],
// 0 // Build by LDPartEditor (PrimGen 2.X)
];
module ldraw_lib__4_4con4(step=0, col=false, unit=2/5, alt=false, line=0.2, solid=!$preview)
    makepoly(ldraw_lib__4_4con4(), step=step, col=col, unit=unit, alt=alt, line=line, solid=solid);
ldraw_lib__4_4con4(line=0.2);
// main file
use <../lib.scad>
use <../p/4-4con4.scad>
use <../p/4-4cylc.scad>
use <../p/4-4cylo.scad>
use <../p/4-4edge.scad>
use <../p/4-4ring3.scad>
use <../p/4-4ring4.scad>
function ldraw_lib__15316() = [
// 0 ~Duplo Axle for Wheel Rim 16 x 21
// 0 Name: 15316.dat
// 0 Author: Philippe Hurbain [Philo]
// 0 !LDRAW_ORG Part UPDATE 2024-08
// 0 !LICENSE Licensed under CC BY 4.0 : see CAreadme.txt
// 
// 0 BFC CERTIFY CCW
  [0,"BFC","CERTIFY"],
  [0,"BFC","CCW"],
// 
// 0 !CATEGORY Wheel
// 
// 0 !HISTORY 2020-12-12 {LEGO/Unity Microgame} Original part shape
// 0 !HISTORY 2021-02-15 [Philo] File preparation for LDraw Parts Tracker
// 0 !HISTORY 2024-09-30 [OrionP] Official Update 2024-08
// 
// 
// 1 16 0 0 28 10 0 0 0 0 10 0 -47 0 4-4cylo.dat
  [1,16,0,0,28,10,0,0,0,0,10,0,-47,0, ldraw_lib__4_4cylo()],
// 1 16 0 0 31 8 0 0 0 0 8 0 2.5 0 4-4cylo.dat
  [1,16,0,0,31,8,0,0,0,0,8,0,2.5,0, ldraw_lib__4_4cylo()],
// 1 16 0 0 28 2 0 0 0 0 2 0 3 0 4-4con4.dat
  [1,16,0,0,28,2,0,0,0,0,2,0,3,0, ldraw_lib__4_4con4()],
// 1 16 0 0 33.5 2 0 0 0 0 2 0 1 0 4-4ring4.dat
  [1,16,0,0,33.5,2,0,0,0,0,2,0,1,0, ldraw_lib__4_4ring4()],
// 1 16 0 0 33.5 2 0 0 0 0 2 0 3.5 0 4-4con4.dat
  [1,16,0,0,33.5,2,0,0,0,0,2,0,3.5,0, ldraw_lib__4_4con4()],
// 1 16 0 0 37 2 0 0 0 0 2 0 -1 0 4-4ring3.dat
  [1,16,0,0,37,2,0,0,0,0,2,0,-1,0, ldraw_lib__4_4ring3()],
// 0 BFC INVERTNEXT
  [0,"BFC","INVERTNEXT"],
// 1 16 0 0 7 6 0 0 0 0 6 0 30 0 4-4cylc.dat
  [1,16,0,0,7,6,0,0,0,0,6,0,30,0, ldraw_lib__4_4cylc()],
// 1 16 0 0 33.5 10 0 0 0 0 10 0 -1 0 4-4edge.dat
  [1,16,0,0,33.5,10,0,0,0,0,10,0,-1,0, ldraw_lib__4_4edge()],
// 1 16 0 0 37 8 0 0 0 0 8 0 -1 0 4-4edge.dat
  [1,16,0,0,37,8,0,0,0,0,8,0,-1,0, ldraw_lib__4_4edge()],
// 1 16 0 0 -22 8 0 0 0 0 8 0 -2.5 0 4-4cylo.dat
  [1,16,0,0,-22,8,0,0,0,0,8,0,-2.5,0, ldraw_lib__4_4cylo()],
// 1 16 0 0 -19 2 0 0 0 0 2 0 -3 0 4-4con4.dat
  [1,16,0,0,-19,2,0,0,0,0,2,0,-3,0, ldraw_lib__4_4con4()],
// 1 16 0 0 -24.5 2 0 0 0 0 2 0 -1 0 4-4ring4.dat
  [1,16,0,0,-24.5,2,0,0,0,0,2,0,-1,0, ldraw_lib__4_4ring4()],
// 1 16 0 0 -24.5 2 0 0 0 0 2 0 -3.5 0 4-4con4.dat
  [1,16,0,0,-24.5,2,0,0,0,0,2,0,-3.5,0, ldraw_lib__4_4con4()],
// 1 16 0 0 -28 2 0 0 0 0 2 0 1 0 4-4ring3.dat
  [1,16,0,0,-28,2,0,0,0,0,2,0,1,0, ldraw_lib__4_4ring3()],
// 0 BFC INVERTNEXT
  [0,"BFC","INVERTNEXT"],
// 1 16 0 0 2 6 0 0 0 0 6 0 -30 0 4-4cylc.dat
  [1,16,0,0,2,6,0,0,0,0,6,0,-30,0, ldraw_lib__4_4cylc()],
// 1 16 0 0 -24.5 10 0 0 0 0 10 0 1 0 4-4edge.dat
  [1,16,0,0,-24.5,10,0,0,0,0,10,0,1,0, ldraw_lib__4_4edge()],
// 1 16 0 0 -28 8 0 0 0 0 8 0 1 0 4-4edge.dat
  [1,16,0,0,-28,8,0,0,0,0,8,0,1,0, ldraw_lib__4_4edge()],
];
module ldraw_lib__15316(step=0, col=false, unit=2/5, alt=false, line=0.2, solid=!$preview)
    makepoly(ldraw_lib__15316(), step=step, col=col, unit=unit, alt=alt, line=line, solid=solid);
ldraw_lib__15316(line=0.2);
